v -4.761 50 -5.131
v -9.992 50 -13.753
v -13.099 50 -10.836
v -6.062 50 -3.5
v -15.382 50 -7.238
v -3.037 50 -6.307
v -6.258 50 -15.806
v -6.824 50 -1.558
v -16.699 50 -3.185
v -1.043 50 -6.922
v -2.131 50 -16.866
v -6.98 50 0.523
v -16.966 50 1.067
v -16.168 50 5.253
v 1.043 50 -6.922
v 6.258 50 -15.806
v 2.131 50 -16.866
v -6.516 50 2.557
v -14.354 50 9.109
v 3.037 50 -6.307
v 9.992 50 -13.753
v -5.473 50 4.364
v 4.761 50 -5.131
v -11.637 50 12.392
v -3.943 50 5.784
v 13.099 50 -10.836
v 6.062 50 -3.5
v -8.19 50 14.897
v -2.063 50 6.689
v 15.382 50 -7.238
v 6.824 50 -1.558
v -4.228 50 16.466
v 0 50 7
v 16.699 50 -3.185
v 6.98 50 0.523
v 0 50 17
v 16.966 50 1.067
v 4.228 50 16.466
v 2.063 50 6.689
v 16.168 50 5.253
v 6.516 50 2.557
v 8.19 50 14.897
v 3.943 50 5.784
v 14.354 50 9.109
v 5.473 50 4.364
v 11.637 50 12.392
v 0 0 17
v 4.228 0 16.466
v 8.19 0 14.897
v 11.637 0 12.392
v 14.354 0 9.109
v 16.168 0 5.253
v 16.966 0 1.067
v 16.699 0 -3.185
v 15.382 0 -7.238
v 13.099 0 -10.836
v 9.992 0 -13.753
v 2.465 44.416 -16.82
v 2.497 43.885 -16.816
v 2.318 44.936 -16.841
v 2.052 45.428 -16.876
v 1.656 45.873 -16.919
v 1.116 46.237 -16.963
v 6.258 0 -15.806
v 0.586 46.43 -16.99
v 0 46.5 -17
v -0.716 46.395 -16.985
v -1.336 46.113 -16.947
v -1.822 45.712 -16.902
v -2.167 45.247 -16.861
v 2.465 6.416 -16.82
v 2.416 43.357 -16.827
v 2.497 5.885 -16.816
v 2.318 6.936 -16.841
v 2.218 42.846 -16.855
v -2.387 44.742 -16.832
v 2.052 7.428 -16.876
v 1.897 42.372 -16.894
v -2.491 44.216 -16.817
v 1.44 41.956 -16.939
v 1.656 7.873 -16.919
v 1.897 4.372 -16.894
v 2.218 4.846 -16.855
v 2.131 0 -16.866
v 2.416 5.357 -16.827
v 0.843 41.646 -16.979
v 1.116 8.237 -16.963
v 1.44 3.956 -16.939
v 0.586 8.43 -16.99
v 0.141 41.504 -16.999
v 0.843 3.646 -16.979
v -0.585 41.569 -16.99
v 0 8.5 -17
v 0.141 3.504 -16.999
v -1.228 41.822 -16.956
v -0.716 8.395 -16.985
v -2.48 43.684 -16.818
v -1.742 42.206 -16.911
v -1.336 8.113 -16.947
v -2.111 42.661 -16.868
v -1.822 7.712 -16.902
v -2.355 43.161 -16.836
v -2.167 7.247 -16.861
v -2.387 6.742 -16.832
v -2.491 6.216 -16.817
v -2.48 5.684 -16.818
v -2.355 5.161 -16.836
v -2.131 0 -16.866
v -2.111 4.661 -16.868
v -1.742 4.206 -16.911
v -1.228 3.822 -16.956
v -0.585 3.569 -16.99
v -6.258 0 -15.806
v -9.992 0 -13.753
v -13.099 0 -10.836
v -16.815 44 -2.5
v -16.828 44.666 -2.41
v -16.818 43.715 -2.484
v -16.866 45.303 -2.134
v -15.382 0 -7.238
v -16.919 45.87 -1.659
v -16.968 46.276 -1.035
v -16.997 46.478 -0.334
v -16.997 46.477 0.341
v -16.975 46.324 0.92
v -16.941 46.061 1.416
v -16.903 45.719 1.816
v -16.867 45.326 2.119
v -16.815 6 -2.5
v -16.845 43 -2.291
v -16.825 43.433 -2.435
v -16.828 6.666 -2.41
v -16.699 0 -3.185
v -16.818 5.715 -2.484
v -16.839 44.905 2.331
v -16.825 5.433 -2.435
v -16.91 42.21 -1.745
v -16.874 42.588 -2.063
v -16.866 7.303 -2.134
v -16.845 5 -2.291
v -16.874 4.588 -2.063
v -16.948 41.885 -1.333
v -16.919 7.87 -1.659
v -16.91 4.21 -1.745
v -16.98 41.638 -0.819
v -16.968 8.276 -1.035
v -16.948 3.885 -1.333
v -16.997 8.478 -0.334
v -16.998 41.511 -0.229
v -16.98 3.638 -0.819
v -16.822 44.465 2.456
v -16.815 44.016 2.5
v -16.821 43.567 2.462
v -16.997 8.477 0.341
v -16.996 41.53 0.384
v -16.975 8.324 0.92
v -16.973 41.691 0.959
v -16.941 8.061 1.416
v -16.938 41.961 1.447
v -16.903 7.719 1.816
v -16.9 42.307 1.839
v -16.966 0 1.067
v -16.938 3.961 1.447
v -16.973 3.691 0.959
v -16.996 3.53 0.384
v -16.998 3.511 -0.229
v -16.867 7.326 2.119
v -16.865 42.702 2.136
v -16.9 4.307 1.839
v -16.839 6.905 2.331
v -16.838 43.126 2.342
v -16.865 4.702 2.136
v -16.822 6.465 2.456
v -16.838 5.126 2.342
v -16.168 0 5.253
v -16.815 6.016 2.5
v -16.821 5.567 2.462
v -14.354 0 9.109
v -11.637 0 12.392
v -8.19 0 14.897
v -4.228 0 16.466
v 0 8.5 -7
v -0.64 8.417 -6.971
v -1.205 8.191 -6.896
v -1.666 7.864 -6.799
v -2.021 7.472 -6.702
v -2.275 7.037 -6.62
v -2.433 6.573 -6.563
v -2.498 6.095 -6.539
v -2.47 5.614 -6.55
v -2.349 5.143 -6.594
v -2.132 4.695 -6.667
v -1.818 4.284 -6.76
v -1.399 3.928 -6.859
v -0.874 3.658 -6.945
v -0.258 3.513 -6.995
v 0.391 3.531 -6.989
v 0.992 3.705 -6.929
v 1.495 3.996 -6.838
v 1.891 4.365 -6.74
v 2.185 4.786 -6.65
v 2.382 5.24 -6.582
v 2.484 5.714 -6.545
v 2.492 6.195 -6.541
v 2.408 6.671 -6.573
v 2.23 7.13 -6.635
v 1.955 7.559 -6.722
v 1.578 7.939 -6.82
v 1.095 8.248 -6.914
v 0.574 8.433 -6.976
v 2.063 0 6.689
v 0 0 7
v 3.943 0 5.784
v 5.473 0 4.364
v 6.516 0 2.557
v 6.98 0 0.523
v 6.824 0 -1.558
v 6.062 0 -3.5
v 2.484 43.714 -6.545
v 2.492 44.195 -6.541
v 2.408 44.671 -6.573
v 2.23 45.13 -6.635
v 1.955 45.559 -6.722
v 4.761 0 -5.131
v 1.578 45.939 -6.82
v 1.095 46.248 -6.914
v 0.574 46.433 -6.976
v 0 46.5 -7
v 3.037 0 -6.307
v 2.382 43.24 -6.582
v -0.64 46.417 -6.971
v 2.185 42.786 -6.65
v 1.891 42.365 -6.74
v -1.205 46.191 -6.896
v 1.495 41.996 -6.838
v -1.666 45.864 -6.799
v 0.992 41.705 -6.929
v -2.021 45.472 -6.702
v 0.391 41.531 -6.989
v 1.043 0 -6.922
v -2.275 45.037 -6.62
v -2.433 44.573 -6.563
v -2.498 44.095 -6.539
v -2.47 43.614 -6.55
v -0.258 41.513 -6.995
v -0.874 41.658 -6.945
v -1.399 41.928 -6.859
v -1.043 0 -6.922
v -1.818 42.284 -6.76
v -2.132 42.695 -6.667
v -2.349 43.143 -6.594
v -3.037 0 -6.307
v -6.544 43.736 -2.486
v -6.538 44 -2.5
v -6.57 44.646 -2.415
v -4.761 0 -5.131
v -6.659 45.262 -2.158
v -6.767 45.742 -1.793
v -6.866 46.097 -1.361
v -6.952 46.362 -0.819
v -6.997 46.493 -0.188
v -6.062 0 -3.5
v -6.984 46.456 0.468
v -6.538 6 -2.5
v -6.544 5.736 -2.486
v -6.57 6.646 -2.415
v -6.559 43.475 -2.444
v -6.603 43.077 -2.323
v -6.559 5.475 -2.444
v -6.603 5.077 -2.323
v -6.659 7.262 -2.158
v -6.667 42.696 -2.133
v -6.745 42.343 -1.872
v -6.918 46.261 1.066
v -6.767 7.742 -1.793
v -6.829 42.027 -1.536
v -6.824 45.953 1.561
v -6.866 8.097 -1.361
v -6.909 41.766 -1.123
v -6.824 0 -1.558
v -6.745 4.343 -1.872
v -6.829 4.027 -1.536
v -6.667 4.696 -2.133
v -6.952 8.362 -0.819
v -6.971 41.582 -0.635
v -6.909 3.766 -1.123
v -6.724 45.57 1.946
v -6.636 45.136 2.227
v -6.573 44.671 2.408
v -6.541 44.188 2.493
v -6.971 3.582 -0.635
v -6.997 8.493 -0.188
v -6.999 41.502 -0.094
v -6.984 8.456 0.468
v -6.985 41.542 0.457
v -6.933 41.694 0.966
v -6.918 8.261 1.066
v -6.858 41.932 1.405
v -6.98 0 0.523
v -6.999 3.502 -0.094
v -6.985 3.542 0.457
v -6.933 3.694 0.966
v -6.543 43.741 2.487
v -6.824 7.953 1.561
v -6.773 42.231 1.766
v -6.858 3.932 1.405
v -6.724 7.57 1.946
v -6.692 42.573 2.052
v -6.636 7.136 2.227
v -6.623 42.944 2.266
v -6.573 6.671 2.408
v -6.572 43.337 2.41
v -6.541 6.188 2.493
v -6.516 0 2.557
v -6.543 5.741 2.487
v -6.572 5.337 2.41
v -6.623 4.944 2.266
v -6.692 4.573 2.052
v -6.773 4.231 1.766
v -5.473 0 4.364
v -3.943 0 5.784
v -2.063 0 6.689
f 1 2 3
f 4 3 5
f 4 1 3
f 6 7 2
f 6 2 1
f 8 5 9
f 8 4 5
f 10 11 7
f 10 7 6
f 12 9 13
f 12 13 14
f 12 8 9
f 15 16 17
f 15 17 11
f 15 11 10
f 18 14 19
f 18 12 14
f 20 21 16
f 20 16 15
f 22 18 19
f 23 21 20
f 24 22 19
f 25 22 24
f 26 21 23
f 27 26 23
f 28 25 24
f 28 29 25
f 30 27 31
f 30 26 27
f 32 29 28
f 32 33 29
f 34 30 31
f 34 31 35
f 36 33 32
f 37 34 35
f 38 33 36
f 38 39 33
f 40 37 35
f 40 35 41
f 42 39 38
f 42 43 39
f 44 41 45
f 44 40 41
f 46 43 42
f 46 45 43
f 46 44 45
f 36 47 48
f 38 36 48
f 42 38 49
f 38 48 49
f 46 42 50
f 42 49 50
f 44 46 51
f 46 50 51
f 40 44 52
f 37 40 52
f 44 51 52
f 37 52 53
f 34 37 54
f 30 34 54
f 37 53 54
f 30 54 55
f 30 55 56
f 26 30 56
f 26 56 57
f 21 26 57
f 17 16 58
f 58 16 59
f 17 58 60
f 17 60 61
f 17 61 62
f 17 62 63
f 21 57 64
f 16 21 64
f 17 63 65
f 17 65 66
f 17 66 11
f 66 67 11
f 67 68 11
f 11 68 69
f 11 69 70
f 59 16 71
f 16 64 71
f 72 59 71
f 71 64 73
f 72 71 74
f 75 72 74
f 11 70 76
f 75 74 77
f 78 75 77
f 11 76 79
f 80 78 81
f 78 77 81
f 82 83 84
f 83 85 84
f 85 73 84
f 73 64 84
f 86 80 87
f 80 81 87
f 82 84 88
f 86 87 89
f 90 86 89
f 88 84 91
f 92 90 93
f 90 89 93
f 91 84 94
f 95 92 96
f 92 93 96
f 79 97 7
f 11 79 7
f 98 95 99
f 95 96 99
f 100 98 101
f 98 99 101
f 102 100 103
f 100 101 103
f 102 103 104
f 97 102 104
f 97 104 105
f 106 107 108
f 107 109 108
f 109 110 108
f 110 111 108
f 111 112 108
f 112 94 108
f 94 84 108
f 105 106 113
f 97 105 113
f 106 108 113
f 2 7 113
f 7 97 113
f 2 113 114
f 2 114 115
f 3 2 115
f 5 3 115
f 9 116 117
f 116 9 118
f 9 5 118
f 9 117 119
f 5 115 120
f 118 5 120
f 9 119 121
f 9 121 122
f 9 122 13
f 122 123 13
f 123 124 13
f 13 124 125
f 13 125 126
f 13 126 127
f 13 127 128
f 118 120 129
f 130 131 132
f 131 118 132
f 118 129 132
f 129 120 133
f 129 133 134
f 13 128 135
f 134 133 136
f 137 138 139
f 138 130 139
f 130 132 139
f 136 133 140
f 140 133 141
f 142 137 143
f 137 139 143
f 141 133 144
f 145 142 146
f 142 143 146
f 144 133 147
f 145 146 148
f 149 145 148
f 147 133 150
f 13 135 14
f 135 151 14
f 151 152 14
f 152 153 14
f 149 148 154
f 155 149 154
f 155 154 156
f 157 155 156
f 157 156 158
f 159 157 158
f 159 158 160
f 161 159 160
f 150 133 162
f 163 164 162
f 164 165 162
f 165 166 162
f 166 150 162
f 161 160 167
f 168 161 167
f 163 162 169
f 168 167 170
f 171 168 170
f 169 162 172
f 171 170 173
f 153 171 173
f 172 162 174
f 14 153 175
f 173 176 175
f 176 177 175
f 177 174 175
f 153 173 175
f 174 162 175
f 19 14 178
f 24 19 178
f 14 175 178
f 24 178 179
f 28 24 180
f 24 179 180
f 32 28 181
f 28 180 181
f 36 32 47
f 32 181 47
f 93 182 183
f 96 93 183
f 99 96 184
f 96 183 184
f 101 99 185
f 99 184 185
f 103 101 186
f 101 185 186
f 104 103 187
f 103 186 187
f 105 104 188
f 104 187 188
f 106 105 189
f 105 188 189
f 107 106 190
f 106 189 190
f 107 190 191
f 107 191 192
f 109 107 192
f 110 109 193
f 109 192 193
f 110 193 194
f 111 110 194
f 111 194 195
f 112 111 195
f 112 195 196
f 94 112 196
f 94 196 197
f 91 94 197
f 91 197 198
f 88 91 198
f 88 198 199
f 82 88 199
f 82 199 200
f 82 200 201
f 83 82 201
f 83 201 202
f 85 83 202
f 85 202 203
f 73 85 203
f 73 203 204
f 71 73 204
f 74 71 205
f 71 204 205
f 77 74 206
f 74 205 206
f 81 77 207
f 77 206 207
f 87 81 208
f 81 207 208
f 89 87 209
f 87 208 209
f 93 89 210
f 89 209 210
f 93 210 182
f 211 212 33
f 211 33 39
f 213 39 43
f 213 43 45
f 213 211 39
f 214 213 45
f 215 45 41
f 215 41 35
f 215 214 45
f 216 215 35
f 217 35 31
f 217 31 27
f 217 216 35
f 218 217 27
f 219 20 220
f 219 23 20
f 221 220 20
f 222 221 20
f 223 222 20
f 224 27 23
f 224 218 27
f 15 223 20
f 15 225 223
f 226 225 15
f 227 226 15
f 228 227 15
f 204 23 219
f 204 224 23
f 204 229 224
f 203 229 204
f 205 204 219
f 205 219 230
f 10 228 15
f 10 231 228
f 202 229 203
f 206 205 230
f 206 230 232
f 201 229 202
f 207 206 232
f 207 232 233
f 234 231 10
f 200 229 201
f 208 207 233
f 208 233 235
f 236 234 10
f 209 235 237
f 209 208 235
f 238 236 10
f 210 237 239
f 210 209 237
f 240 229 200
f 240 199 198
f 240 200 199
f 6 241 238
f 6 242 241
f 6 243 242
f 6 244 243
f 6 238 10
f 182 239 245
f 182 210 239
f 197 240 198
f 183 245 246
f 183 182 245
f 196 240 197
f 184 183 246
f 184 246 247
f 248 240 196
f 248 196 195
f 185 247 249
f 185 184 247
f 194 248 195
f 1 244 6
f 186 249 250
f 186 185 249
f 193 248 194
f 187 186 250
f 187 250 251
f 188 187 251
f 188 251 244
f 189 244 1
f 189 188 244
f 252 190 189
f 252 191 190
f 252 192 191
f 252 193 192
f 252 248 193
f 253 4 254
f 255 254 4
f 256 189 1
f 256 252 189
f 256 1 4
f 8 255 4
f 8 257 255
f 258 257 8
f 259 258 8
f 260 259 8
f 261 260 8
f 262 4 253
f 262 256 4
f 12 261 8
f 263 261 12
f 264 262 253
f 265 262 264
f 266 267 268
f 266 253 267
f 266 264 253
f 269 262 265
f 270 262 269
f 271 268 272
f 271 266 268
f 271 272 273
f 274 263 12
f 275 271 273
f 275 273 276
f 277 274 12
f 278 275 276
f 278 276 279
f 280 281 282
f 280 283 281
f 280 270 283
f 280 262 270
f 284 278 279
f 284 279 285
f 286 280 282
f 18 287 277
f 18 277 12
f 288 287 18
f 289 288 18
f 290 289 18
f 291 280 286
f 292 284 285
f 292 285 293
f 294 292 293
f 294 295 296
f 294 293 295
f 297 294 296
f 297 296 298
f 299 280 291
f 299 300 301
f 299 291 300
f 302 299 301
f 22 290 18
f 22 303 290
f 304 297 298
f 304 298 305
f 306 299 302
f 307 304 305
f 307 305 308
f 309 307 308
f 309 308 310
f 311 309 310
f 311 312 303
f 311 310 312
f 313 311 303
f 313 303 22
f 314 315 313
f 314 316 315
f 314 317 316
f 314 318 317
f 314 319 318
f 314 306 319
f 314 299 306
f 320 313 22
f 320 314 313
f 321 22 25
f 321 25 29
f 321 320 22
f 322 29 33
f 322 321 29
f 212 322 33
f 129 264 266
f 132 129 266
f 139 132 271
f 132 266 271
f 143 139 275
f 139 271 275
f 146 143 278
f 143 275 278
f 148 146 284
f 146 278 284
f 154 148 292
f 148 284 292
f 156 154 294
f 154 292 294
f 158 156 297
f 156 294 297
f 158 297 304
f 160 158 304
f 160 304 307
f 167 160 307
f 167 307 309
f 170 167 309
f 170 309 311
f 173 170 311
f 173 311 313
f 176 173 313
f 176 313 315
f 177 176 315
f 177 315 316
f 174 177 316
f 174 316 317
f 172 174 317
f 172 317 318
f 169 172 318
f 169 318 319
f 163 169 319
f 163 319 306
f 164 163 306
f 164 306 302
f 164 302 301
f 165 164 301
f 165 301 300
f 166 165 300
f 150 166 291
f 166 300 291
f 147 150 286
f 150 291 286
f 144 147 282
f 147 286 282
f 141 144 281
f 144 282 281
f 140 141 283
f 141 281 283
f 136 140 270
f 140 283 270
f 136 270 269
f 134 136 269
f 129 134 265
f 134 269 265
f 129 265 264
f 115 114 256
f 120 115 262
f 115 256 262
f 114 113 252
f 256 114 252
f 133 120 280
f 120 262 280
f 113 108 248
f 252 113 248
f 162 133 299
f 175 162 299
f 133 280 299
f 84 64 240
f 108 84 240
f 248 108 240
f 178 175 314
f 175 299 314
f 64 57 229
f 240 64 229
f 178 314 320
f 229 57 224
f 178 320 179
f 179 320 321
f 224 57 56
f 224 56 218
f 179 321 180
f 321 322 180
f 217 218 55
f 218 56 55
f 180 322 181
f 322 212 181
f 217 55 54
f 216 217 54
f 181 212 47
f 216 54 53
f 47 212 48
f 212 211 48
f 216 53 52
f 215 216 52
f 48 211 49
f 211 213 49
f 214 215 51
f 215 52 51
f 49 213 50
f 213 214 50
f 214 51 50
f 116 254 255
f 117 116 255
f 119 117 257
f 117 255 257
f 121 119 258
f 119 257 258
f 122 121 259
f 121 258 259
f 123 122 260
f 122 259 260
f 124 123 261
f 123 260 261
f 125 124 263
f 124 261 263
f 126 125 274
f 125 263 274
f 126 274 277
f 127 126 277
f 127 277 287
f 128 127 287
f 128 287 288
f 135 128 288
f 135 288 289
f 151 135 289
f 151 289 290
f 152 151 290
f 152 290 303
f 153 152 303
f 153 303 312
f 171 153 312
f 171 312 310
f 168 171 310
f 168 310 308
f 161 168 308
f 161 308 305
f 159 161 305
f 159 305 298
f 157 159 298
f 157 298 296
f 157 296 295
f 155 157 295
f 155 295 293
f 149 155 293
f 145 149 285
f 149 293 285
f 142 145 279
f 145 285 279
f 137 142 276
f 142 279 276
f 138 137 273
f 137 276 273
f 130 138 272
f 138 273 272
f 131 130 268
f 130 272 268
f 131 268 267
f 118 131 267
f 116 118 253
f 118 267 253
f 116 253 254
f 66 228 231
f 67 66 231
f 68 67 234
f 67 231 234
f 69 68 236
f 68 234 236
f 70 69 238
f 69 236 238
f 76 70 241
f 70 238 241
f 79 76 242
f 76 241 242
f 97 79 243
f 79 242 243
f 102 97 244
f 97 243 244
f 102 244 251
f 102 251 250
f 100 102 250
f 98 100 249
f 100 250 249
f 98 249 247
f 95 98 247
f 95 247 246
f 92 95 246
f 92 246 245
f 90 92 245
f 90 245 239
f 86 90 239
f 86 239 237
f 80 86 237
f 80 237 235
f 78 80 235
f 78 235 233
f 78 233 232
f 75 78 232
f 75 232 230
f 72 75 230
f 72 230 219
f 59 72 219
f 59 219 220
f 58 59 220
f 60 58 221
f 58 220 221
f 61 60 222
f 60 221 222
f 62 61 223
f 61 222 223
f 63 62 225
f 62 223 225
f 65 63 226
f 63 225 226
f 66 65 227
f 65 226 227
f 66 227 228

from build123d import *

# Parameters (mm, degrees)
SKETCH1_R           = 17
SKETCH1_R_2         = 7
BOSS_EXTRUDE1_DEPTH = 50
SKETCH2_R           = 2.5
CUT_EXTRUDE1_DEPTH  = 56.479726027
SKETCH3_R           = 2.5
CUT_EXTRUDE2_DEPTH  = 56.479726178


with BuildPart() as part:
    # Sketch1 → Boss-Extrude1 (new body)
    with BuildSketch(Plane(origin=(0, 0, 0), x_dir=(1, 0, 0), z_dir=(0, 1, 0))):
        with Locations(Location((0, 0, 0), (0, 0, 270))):
            Circle(SKETCH1_R)
        with Locations(Location((0, 0, 0), (0, 0, 270))):
            Circle(SKETCH1_R_2, mode=Mode.SUBTRACT)
    extrude(amount=BOSS_EXTRUDE1_DEPTH)

    # Sketch2 → Cut-Extrude1 (cut, through all)
    with BuildSketch(Plane.XY):
        with Locations(Location((0, 44, 0), (0, 0, 90))):
            Circle(SKETCH2_R)
        with Locations(Location((0, 6, 0), (0, 0, 90))):
            Circle(SKETCH2_R)
    extrude(amount=-CUT_EXTRUDE1_DEPTH, mode=Mode.SUBTRACT)

    # Sketch3 → Cut-Extrude2 (cut, through all)
    with BuildSketch(Plane(origin=(0, 0, 0), x_dir=(0, 0, -1), z_dir=(1, 0, 0))):
        with Locations((0, 44)):
            Circle(SKETCH3_R)
        with Locations((0, 6)):
            Circle(SKETCH3_R)
    extrude(amount=-CUT_EXTRUDE2_DEPTH, mode=Mode.SUBTRACT)


solid = part.part
